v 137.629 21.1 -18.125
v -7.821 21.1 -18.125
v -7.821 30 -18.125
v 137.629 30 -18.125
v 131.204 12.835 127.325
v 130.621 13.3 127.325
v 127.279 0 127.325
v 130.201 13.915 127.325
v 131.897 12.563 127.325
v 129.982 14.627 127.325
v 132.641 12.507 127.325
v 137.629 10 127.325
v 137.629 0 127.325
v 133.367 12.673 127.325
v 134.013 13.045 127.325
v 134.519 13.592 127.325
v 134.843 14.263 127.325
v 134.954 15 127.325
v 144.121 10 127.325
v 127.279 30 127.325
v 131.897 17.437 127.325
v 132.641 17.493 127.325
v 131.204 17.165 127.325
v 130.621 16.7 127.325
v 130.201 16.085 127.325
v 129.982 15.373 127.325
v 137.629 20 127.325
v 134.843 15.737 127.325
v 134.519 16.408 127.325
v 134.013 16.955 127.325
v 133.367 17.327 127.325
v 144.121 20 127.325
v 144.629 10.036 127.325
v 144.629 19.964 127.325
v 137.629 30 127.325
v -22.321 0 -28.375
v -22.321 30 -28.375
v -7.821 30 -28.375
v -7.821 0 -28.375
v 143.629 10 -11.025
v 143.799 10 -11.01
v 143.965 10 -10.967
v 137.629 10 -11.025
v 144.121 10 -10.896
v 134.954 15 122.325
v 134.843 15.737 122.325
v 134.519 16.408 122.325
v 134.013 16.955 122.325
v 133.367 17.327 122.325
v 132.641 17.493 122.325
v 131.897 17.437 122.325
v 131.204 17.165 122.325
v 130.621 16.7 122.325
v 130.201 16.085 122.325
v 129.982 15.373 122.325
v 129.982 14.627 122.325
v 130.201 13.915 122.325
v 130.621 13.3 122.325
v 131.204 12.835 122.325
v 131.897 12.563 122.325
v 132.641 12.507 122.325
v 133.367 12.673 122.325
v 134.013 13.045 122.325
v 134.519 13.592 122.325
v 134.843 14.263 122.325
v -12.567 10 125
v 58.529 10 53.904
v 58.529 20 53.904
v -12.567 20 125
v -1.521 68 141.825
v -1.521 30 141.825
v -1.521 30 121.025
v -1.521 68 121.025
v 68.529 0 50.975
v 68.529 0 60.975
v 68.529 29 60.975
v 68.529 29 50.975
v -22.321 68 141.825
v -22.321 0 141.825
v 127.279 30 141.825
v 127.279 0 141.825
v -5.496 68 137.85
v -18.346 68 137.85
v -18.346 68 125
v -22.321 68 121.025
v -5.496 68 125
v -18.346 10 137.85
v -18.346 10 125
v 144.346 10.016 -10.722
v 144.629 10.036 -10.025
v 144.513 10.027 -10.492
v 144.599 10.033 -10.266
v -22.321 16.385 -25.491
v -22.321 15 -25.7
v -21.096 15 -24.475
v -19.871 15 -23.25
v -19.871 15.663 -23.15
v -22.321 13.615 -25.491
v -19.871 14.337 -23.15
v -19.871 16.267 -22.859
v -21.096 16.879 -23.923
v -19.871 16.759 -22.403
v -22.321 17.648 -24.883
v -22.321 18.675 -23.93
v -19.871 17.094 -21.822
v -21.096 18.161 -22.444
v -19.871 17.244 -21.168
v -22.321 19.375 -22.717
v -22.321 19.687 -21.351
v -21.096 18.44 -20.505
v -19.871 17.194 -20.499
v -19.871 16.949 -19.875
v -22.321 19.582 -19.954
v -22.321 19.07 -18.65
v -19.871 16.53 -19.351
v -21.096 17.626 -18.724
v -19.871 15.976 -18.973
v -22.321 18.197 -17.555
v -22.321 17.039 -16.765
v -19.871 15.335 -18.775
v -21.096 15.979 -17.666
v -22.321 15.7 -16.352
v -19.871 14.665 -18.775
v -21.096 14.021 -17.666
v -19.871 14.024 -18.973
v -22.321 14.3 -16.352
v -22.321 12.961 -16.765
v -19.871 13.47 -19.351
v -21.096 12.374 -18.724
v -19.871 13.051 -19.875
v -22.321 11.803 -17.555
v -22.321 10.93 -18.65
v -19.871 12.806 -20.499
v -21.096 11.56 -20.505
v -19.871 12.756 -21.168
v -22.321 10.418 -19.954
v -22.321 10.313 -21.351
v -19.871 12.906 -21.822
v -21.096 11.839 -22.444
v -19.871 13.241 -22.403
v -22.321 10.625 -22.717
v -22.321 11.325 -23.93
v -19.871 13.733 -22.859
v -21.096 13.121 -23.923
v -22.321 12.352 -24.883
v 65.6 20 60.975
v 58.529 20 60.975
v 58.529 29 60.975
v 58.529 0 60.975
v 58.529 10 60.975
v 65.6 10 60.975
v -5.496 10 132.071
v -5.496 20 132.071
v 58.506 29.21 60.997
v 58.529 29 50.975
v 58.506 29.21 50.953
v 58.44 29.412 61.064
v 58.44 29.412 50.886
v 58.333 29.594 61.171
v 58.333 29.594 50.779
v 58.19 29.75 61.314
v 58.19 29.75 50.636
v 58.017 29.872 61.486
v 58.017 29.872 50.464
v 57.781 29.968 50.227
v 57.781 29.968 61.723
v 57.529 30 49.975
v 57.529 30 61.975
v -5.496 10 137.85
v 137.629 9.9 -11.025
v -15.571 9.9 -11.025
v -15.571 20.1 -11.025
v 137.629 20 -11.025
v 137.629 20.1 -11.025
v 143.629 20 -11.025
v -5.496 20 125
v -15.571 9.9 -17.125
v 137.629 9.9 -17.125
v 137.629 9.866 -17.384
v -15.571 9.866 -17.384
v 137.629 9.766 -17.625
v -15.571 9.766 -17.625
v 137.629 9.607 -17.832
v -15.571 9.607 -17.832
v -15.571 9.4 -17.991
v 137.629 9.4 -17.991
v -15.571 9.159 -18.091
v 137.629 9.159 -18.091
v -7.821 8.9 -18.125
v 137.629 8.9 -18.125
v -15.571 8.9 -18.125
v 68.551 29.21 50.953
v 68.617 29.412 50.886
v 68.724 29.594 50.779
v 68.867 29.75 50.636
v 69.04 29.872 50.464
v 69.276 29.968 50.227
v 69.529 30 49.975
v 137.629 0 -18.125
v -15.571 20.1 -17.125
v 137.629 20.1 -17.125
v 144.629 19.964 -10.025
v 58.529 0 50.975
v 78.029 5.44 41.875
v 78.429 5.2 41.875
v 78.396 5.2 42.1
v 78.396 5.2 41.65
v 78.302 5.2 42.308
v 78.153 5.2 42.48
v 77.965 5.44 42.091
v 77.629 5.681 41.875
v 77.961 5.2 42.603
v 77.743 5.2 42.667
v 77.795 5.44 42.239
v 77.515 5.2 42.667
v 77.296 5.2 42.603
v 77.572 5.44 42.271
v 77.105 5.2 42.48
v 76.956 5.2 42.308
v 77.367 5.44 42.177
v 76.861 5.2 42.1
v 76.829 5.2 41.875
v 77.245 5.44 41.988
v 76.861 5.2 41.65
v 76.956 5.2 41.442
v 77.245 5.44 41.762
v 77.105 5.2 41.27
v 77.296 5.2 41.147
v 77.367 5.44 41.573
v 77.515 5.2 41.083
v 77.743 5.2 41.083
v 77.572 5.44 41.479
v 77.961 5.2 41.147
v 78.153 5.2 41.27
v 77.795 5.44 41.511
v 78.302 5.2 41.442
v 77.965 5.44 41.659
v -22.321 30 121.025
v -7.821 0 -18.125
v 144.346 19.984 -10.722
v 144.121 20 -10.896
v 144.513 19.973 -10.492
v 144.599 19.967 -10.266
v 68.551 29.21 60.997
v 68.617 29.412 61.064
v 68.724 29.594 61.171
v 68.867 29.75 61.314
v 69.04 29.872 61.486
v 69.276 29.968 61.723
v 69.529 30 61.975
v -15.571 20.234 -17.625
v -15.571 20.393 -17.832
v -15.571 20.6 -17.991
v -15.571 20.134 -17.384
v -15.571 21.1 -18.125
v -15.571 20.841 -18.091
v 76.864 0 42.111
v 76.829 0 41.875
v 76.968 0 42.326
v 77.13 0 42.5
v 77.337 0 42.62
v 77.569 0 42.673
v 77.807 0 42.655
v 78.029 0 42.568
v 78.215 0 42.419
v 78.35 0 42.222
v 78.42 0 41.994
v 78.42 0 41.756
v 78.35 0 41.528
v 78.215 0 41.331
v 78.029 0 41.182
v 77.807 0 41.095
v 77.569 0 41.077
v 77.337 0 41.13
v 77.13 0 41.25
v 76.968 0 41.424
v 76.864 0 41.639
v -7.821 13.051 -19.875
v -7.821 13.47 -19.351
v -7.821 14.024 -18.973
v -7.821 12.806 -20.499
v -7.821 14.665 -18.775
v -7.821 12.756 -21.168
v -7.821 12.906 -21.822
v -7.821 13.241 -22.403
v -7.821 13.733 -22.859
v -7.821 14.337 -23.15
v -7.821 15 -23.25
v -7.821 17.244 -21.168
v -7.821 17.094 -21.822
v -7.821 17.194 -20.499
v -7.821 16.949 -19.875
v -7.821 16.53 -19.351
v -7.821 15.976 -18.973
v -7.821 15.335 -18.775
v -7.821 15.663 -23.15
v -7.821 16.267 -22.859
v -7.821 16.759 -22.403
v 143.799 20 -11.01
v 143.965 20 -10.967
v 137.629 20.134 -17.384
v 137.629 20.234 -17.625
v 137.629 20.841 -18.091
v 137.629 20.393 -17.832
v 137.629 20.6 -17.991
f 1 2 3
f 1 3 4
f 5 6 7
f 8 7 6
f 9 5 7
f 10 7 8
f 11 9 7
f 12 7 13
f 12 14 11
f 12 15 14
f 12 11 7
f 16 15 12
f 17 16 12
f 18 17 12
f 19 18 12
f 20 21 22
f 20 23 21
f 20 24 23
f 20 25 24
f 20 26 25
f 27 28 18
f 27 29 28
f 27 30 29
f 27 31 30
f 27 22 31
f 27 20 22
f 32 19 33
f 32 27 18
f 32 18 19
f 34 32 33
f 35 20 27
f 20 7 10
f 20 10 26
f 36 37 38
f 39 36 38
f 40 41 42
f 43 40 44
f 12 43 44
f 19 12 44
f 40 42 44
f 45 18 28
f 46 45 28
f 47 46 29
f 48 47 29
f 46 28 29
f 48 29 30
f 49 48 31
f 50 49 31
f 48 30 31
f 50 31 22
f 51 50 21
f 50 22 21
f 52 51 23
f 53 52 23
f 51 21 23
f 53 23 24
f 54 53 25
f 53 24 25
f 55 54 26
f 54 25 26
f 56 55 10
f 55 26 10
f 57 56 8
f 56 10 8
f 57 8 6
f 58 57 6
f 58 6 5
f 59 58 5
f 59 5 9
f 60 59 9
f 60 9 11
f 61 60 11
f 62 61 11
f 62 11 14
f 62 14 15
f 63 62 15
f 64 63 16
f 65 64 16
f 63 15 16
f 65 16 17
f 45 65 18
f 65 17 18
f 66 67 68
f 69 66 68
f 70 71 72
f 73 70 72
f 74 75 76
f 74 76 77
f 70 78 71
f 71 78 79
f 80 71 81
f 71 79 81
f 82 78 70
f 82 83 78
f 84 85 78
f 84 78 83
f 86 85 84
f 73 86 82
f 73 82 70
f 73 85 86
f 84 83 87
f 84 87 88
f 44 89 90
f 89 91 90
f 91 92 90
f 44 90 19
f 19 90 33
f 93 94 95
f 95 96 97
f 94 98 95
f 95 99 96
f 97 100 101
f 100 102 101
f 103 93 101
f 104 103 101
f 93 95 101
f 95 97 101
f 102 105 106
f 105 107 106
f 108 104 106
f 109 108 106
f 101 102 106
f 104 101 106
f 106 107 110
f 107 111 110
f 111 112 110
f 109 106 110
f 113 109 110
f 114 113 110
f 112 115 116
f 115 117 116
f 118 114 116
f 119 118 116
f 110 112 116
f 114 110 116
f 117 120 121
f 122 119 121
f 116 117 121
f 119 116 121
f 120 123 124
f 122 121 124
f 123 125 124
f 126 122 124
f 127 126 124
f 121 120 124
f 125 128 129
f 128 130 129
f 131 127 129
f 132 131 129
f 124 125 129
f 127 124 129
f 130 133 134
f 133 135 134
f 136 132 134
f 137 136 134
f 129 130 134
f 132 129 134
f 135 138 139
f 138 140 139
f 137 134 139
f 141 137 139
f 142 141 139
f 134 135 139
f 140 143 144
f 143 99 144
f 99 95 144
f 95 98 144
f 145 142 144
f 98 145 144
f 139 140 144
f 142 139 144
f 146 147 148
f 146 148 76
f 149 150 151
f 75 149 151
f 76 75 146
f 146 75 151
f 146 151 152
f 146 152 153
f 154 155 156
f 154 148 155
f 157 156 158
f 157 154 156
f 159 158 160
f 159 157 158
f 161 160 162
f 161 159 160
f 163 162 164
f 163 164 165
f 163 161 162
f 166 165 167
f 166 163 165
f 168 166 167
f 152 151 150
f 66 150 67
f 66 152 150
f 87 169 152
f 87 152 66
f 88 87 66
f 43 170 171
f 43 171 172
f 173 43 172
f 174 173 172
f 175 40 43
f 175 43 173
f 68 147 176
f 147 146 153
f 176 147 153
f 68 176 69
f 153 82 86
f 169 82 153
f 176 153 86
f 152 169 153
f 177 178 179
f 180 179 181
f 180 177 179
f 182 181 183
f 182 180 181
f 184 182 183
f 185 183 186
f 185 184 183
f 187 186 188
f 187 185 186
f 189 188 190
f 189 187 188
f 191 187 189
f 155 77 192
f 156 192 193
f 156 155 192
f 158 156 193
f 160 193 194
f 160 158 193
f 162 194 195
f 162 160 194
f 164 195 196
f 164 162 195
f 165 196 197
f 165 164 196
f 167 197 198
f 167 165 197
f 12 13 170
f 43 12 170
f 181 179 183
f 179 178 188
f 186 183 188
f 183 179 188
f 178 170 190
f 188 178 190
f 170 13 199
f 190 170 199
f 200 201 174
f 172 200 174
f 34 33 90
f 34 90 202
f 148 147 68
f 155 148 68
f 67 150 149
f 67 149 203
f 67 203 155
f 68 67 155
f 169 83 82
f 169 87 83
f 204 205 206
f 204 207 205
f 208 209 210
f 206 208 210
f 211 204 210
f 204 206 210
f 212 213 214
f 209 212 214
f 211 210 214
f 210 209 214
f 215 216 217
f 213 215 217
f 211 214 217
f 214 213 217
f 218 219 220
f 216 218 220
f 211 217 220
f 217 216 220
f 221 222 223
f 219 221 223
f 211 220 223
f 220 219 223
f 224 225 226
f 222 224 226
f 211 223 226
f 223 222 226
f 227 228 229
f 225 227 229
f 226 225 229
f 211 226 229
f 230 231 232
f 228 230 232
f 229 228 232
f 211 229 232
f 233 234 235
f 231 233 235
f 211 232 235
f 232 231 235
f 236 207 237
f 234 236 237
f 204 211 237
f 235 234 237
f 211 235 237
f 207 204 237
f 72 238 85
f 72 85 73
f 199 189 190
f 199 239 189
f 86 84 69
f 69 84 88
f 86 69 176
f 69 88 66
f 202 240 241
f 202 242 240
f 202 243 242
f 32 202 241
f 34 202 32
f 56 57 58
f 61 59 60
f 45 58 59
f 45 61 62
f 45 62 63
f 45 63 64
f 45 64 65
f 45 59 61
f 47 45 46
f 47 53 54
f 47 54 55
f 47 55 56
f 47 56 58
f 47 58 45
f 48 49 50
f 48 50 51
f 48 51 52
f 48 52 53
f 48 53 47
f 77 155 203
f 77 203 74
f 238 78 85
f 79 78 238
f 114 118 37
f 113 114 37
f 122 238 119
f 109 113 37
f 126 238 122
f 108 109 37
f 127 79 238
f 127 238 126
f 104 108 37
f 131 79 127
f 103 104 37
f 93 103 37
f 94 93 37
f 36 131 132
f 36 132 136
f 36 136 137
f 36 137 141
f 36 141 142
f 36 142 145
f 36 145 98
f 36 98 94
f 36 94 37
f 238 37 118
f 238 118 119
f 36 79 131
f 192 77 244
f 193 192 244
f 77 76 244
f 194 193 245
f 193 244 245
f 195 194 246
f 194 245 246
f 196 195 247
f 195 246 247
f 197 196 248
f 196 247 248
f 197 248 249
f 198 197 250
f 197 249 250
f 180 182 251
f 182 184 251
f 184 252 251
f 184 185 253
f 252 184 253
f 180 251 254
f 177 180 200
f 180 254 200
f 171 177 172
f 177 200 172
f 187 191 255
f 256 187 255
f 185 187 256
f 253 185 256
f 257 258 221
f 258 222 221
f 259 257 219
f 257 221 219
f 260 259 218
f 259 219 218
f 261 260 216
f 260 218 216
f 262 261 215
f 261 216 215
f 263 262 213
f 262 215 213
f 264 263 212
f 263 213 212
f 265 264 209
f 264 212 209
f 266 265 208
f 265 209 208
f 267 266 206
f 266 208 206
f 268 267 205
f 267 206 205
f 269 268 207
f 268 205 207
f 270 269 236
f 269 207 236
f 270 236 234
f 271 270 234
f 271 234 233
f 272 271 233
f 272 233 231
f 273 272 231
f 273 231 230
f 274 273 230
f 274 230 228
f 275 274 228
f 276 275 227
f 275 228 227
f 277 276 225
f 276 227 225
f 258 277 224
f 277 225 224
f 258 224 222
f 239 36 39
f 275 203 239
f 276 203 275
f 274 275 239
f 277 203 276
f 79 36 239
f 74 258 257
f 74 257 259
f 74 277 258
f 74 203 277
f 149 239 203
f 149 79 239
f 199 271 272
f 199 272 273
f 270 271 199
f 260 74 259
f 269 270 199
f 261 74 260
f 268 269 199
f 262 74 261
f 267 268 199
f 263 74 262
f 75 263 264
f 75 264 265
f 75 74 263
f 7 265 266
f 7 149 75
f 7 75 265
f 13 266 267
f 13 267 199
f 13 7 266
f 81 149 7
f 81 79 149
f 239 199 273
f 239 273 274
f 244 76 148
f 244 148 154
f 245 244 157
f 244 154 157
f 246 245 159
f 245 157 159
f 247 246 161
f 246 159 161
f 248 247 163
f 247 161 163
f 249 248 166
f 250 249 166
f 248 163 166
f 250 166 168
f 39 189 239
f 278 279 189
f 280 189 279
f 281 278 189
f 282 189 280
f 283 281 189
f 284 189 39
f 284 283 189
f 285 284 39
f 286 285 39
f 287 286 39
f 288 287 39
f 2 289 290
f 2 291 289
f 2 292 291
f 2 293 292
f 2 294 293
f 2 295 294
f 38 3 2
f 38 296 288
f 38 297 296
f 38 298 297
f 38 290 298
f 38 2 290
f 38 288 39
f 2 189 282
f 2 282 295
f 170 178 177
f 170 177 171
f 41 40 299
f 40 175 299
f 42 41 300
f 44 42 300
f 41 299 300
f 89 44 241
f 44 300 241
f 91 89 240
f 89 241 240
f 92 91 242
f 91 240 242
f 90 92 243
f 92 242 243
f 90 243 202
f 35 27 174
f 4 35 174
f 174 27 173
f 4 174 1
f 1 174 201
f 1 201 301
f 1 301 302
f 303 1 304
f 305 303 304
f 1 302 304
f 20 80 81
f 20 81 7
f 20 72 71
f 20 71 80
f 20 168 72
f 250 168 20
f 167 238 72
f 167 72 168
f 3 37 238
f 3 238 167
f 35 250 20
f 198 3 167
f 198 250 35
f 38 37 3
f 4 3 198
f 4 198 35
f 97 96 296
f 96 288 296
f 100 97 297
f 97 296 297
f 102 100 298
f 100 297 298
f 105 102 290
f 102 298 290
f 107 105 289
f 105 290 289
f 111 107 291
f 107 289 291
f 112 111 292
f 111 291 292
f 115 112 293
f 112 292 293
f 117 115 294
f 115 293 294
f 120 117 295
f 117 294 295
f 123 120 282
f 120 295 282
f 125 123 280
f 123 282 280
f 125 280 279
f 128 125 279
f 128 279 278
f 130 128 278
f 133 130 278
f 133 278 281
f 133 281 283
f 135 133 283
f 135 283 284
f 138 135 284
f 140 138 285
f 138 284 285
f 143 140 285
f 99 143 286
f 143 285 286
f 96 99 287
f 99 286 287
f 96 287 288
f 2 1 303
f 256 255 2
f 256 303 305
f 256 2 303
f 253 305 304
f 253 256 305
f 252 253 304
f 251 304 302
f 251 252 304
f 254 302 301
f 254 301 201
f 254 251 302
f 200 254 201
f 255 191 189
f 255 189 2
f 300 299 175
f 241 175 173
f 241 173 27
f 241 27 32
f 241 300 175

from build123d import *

# Parameters (mm, degrees)
SKETCH1_W                                           = 159.95
SKETCH1_H                                           = 159.95
BOSS_EXTRUDE2_DEPTH                                 = 30
SKETCH3_W                                           = 7
SKETCH3_H                                           = 10
BOSS_EXTRUDE4_DEPTH                                 = 145.45
CHAMFER1_SIZE                                       = 0.508
CHAMFER1_SIZE2                                      = 0.03552282
CHAMFER2_SIZE                                       = 0.508
CHAMFER2_SIZE2                                      = 0.03552282
SKETCH4_W                                           = 7.1
SKETCH4_H                                           = 10.2
CUT_EXTRUDE6_DEPTH                                  = 160.2
FILLET1_R                                           = 1
SKETCH6_W                                           = 10.35
SKETCH6_H                                           = 14.5
CUT_EXTRUDE7_DEPTH                                  = 80
BOSS_EXTRUDE5_REACH                                 = 206.773
SKETCH7_W                                           = 14.5
SKETCH7_H                                           = 10.25
CSK_FOR_M4_COUNTERSUNK_FLAT_HEAD_SCREW1_D           = 4.5
CSK_FOR_M4_COUNTERSUNK_FLAT_HEAD_SCREW1_DEPTH       = 16
CSK_FOR_M4_COUNTERSUNK_FLAT_HEAD_SCREW1_CSINK_D     = 9.4
CSK_FOR_M4_COUNTERSUNK_FLAT_HEAD_SCREW1_CSINK_ANGLE = 90
CSK_FOR_M4_COUNTERSUNK_FLAT_HEAD_SCREW1_TIP         = 1.351936393
SKETCH12_R                                          = 2.5
CUT_EXTRUDE9_DEPTH                                  = 5
FILLET2_START                                       = -15.571212121
FILLET2_DEPTH                                       = 154.571212121
FILLET3_START                                       = -15.571212121
FILLET3_DEPTH                                       = 154.571212121
M2_TAPPED_HOLE1_D                                   = 1.6
M2_TAPPED_HOLE1_DEPTH                               = 5.2
M2_TAPPED_HOLE1_TIP                                 = 0.480688495
SKETCH29_W                                          = 20.8
SKETCH29_H                                          = 20.8
SKETCH29_W_2                                        = 12.85
SKETCH29_H_2                                        = 12.85
BOSS_EXTRUDE6_DEPTH                                 = 38
CUT_EXTRUDE15_DEPTH                                 = 207.096620322
CUT_EXTRUDE15_DEPTH_BACK                            = 207.096620322
SKETCH26_W                                          = 10
SKETCH26_H                                          = 10
CUT_EXTRUDE16_DEPTH                                 = 8.5
CUT_EXTRUDE16_DEPTH_BACK                            = 98.4
SKETCH30_W                                          = 10
SKETCH30_H                                          = 10
SKETCH31_W                                          = 12.85
SKETCH31_H                                          = 12.85
CUT_EXTRUDE17_DEPTH                                 = 20
FILLET4_R                                           = 1


with BuildPart() as part:
    # Sketch1 → Boss-Extrude2 (new body)
    with BuildSketch(Plane(origin=(0, 0, 0), x_dir=(1, 0, 0), z_dir=(0, 1, 0))):
        with Locations((57.653787879, -61.85)):
            Rectangle(SKETCH1_W, SKETCH1_H)
    extrude(amount=BOSS_EXTRUDE2_DEPTH)

    # Sketch3 → Boss-Extrude4 (add)
    with BuildSketch(Plane.XY.offset(-18.125)):
        with Locations((141.128787879, 15)):
            Rectangle(SKETCH3_W, SKETCH3_H)
    extrude(amount=BOSS_EXTRUDE4_DEPTH)

    # Chamfer1
    chamfer1_edges = [part.edges().sort_by_distance(p)[0] for p in [
        (144.628787879, 20, 54.6),
    ]]
    chamfer1_side = [part.faces().sort_by_distance(p)[0] for p in [
        (141.128787879, 20, 54.6),
    ]]
    chamfer(chamfer1_edges, length=CHAMFER1_SIZE, length2=CHAMFER1_SIZE2, reference=chamfer1_side[0])

    # Chamfer2
    chamfer2_edges = [part.edges().sort_by_distance(p)[0] for p in [
        (144.628787879, 10, 54.6),
    ]]
    chamfer2_side = [part.faces().sort_by_distance(p)[0] for p in [
        (141.128787879, 10, 54.6),
    ]]
    chamfer(chamfer2_edges, length=CHAMFER2_SIZE, length2=CHAMFER2_SIZE2, reference=chamfer2_side[0])

    # Sketch4 → Cut-Extrude6 (cut)
    with BuildSketch(Plane.ZY.offset(-144.628787879)):
        with Locations((-14.575, 15)):
            Rectangle(SKETCH4_W, SKETCH4_H)
    extrude(amount=CUT_EXTRUDE6_DEPTH, mode=Mode.SUBTRACT)

    # Fillet1
    fillet1_edges = [part.edges().sort_by_distance(p)[0] for p in [
        (144.628787879, 15, -11.025),
    ]]
    fillet(fillet1_edges, radius=FILLET1_R)

    # Sketch6 → Cut-Extrude7 (cut)
    with BuildSketch(Plane(origin=(0, 30, 0), x_dir=(1, 0, 0), z_dir=(0, 1, 0))):
        with Locations((132.453787879, -134.575)):
            Rectangle(SKETCH6_W, SKETCH6_H)
    extrude(amount=-CUT_EXTRUDE7_DEPTH, mode=Mode.SUBTRACT)

    # Boss-Extrude5: up to this face of the body (flat: up to its plane)
    boss_extrude5_end = Plane(part.part.faces().sort_by_distance((57.212424271, 0, 61.420880102))[0])
    # Sketch7 → Boss-Extrude5 (add, up to the picked face)
    with BuildSketch(Plane(origin=(0, 30, 0), x_dir=(1, 0, 0), z_dir=(0, 1, 0)), mode=Mode.PRIVATE) as boss_extrude5_sk1:
        with Locations((-15.071212121, 23.25)):
            Rectangle(SKETCH7_W, SKETCH7_H)
    boss_extrude5_tool1 = split(extrude(boss_extrude5_sk1.sketch, amount=-BOSS_EXTRUDE5_REACH, mode=Mode.PRIVATE), bisect_by=boss_extrude5_end, keep=Keep.BOTH, mode=Mode.PRIVATE)
    add(boss_extrude5_tool1.solids().sort_by(Axis((-15.071212, 30, -23.25), (0, -1, 0)))[0])

    # CSK for M4 Countersunk Flat Head Screw1
    with Locations(Plane.ZY.offset(22.321212121)):
        with Locations((-21, 15)):
            CounterSinkHole(CSK_FOR_M4_COUNTERSUNK_FLAT_HEAD_SCREW1_D / 2, CSK_FOR_M4_COUNTERSUNK_FLAT_HEAD_SCREW1_CSINK_D / 2, depth=CSK_FOR_M4_COUNTERSUNK_FLAT_HEAD_SCREW1_DEPTH, counter_sink_angle=CSK_FOR_M4_COUNTERSUNK_FLAT_HEAD_SCREW1_CSINK_ANGLE)
            with Locations((0, 0, -(CSK_FOR_M4_COUNTERSUNK_FLAT_HEAD_SCREW1_DEPTH + CSK_FOR_M4_COUNTERSUNK_FLAT_HEAD_SCREW1_TIP / 2))):  # 118° drill point
                Cone(0, CSK_FOR_M4_COUNTERSUNK_FLAT_HEAD_SCREW1_D / 2, CSK_FOR_M4_COUNTERSUNK_FLAT_HEAD_SCREW1_TIP, mode=Mode.SUBTRACT)

    # Sketch12 → Cut-Extrude9 (cut)
    with BuildSketch(Plane.XY.offset(127.325)):
        with Locations((132.453787879, 15)):
            Circle(SKETCH12_R)
    extrude(amount=-CUT_EXTRUDE9_DEPTH, mode=Mode.SUBTRACT)

    # Fillet2: read off the stored shape, not the designer's step
    # Fillet2 outline → Fillet2 (cut)
    with BuildSketch(Plane.YZ.offset(FILLET2_START)):
        with BuildLine():
            Line((20.1, -18.125), (21.1, -18.125))
            ThreePointArc((21.1, -18.125), (20.392893219, -17.832106781), (20.1, -17.125))
            Line((20.1, -17.125), (20.1, -18.125))
        make_face()
    extrude(amount=FILLET2_DEPTH, mode=Mode.SUBTRACT)

    # Fillet3: read off the stored shape, not the designer's step
    # Fillet3 outline → Fillet3 (cut)
    with BuildSketch(Plane.YZ.offset(FILLET3_START)):
        with BuildLine():
            ThreePointArc((9.9, -17.125), (9.607106781, -17.832106781), (8.9, -18.125))
            Line((8.9, -18.125), (9.9, -18.125))
            Line((9.9, -18.125), (9.9, -17.125))
        make_face()
    extrude(amount=FILLET3_DEPTH, mode=Mode.SUBTRACT)

    # M2 Tapped Hole1
    with Locations(Plane.XZ):
        with Locations((77.628787879, 41.875)):
            Hole(M2_TAPPED_HOLE1_D / 2, depth=M2_TAPPED_HOLE1_DEPTH)
            with Locations((0, 0, -(M2_TAPPED_HOLE1_DEPTH + M2_TAPPED_HOLE1_TIP / 2))):  # 118° drill point
                Cone(0, M2_TAPPED_HOLE1_D / 2, M2_TAPPED_HOLE1_TIP, mode=Mode.SUBTRACT)

    # Sketch29 → Boss-Extrude6 (add)
    with BuildSketch(Plane(origin=(0, 30, 0), x_dir=(1, 0, 0), z_dir=(0, 1, 0))):
        with Locations((-11.921212121, -131.425)):
            Rectangle(SKETCH29_W, SKETCH29_H)
        with Locations((-11.921212121, -131.425)):
            Rectangle(SKETCH29_W_2, SKETCH29_H_2, mode=Mode.SUBTRACT)
    extrude(amount=BOSS_EXTRUDE6_DEPTH)

    # Sketch26 → Cut-Extrude15 (cut, two sides: drawn at the far end of the back side and taken through both)
    with BuildSketch(Plane(origin=(0, 30, 0), x_dir=(1, 0, 0), z_dir=(0, 1, 0)).offset(-CUT_EXTRUDE15_DEPTH_BACK)):
        with Locations((63.528787879, -55.975)):
            Rectangle(SKETCH26_W, SKETCH26_H)
    extrude(amount=CUT_EXTRUDE15_DEPTH + CUT_EXTRUDE15_DEPTH_BACK, mode=Mode.SUBTRACT)

    # Sketch30 → Cut-Extrude16 (cut, two sides: drawn at the far end of the back side and taken through both)
    with BuildSketch(Plane(origin=(-2.098106061, 0, 2.098106061), x_dir=(-0.7071067811865477, 0, -0.7071067811865475), z_dir=(0.7071067811865475, 0, -0.7071067811865477)).offset(-CUT_EXTRUDE16_DEPTH_BACK)):
        with Locations((-84.501938787, 15)):
            Rectangle(SKETCH30_W, SKETCH30_H)
    extrude(amount=CUT_EXTRUDE16_DEPTH + CUT_EXTRUDE16_DEPTH_BACK, mode=Mode.SUBTRACT)

    # Sketch31 → Cut-Extrude17 (cut)
    with BuildSketch(Plane(origin=(0, 30, 0), x_dir=(1, 0, 0), z_dir=(0, 1, 0))):
        with Locations((-11.921212121, -131.425)):
            Rectangle(SKETCH31_W, SKETCH31_H)
    extrude(amount=-CUT_EXTRUDE17_DEPTH, mode=Mode.SUBTRACT)

    # Fillet4
    fillet4_edges = [part.edges().sort_by_distance(p)[0] for p in [
        (58.528787879, 30, 55.975),
        (63.528787879, 30, 60.975),
        (68.528787879, 30, 55.975),
        (63.528787879, 30, 50.975),
    ]]
    fillet(fillet4_edges, radius=FILLET4_R)


solid = part.part
